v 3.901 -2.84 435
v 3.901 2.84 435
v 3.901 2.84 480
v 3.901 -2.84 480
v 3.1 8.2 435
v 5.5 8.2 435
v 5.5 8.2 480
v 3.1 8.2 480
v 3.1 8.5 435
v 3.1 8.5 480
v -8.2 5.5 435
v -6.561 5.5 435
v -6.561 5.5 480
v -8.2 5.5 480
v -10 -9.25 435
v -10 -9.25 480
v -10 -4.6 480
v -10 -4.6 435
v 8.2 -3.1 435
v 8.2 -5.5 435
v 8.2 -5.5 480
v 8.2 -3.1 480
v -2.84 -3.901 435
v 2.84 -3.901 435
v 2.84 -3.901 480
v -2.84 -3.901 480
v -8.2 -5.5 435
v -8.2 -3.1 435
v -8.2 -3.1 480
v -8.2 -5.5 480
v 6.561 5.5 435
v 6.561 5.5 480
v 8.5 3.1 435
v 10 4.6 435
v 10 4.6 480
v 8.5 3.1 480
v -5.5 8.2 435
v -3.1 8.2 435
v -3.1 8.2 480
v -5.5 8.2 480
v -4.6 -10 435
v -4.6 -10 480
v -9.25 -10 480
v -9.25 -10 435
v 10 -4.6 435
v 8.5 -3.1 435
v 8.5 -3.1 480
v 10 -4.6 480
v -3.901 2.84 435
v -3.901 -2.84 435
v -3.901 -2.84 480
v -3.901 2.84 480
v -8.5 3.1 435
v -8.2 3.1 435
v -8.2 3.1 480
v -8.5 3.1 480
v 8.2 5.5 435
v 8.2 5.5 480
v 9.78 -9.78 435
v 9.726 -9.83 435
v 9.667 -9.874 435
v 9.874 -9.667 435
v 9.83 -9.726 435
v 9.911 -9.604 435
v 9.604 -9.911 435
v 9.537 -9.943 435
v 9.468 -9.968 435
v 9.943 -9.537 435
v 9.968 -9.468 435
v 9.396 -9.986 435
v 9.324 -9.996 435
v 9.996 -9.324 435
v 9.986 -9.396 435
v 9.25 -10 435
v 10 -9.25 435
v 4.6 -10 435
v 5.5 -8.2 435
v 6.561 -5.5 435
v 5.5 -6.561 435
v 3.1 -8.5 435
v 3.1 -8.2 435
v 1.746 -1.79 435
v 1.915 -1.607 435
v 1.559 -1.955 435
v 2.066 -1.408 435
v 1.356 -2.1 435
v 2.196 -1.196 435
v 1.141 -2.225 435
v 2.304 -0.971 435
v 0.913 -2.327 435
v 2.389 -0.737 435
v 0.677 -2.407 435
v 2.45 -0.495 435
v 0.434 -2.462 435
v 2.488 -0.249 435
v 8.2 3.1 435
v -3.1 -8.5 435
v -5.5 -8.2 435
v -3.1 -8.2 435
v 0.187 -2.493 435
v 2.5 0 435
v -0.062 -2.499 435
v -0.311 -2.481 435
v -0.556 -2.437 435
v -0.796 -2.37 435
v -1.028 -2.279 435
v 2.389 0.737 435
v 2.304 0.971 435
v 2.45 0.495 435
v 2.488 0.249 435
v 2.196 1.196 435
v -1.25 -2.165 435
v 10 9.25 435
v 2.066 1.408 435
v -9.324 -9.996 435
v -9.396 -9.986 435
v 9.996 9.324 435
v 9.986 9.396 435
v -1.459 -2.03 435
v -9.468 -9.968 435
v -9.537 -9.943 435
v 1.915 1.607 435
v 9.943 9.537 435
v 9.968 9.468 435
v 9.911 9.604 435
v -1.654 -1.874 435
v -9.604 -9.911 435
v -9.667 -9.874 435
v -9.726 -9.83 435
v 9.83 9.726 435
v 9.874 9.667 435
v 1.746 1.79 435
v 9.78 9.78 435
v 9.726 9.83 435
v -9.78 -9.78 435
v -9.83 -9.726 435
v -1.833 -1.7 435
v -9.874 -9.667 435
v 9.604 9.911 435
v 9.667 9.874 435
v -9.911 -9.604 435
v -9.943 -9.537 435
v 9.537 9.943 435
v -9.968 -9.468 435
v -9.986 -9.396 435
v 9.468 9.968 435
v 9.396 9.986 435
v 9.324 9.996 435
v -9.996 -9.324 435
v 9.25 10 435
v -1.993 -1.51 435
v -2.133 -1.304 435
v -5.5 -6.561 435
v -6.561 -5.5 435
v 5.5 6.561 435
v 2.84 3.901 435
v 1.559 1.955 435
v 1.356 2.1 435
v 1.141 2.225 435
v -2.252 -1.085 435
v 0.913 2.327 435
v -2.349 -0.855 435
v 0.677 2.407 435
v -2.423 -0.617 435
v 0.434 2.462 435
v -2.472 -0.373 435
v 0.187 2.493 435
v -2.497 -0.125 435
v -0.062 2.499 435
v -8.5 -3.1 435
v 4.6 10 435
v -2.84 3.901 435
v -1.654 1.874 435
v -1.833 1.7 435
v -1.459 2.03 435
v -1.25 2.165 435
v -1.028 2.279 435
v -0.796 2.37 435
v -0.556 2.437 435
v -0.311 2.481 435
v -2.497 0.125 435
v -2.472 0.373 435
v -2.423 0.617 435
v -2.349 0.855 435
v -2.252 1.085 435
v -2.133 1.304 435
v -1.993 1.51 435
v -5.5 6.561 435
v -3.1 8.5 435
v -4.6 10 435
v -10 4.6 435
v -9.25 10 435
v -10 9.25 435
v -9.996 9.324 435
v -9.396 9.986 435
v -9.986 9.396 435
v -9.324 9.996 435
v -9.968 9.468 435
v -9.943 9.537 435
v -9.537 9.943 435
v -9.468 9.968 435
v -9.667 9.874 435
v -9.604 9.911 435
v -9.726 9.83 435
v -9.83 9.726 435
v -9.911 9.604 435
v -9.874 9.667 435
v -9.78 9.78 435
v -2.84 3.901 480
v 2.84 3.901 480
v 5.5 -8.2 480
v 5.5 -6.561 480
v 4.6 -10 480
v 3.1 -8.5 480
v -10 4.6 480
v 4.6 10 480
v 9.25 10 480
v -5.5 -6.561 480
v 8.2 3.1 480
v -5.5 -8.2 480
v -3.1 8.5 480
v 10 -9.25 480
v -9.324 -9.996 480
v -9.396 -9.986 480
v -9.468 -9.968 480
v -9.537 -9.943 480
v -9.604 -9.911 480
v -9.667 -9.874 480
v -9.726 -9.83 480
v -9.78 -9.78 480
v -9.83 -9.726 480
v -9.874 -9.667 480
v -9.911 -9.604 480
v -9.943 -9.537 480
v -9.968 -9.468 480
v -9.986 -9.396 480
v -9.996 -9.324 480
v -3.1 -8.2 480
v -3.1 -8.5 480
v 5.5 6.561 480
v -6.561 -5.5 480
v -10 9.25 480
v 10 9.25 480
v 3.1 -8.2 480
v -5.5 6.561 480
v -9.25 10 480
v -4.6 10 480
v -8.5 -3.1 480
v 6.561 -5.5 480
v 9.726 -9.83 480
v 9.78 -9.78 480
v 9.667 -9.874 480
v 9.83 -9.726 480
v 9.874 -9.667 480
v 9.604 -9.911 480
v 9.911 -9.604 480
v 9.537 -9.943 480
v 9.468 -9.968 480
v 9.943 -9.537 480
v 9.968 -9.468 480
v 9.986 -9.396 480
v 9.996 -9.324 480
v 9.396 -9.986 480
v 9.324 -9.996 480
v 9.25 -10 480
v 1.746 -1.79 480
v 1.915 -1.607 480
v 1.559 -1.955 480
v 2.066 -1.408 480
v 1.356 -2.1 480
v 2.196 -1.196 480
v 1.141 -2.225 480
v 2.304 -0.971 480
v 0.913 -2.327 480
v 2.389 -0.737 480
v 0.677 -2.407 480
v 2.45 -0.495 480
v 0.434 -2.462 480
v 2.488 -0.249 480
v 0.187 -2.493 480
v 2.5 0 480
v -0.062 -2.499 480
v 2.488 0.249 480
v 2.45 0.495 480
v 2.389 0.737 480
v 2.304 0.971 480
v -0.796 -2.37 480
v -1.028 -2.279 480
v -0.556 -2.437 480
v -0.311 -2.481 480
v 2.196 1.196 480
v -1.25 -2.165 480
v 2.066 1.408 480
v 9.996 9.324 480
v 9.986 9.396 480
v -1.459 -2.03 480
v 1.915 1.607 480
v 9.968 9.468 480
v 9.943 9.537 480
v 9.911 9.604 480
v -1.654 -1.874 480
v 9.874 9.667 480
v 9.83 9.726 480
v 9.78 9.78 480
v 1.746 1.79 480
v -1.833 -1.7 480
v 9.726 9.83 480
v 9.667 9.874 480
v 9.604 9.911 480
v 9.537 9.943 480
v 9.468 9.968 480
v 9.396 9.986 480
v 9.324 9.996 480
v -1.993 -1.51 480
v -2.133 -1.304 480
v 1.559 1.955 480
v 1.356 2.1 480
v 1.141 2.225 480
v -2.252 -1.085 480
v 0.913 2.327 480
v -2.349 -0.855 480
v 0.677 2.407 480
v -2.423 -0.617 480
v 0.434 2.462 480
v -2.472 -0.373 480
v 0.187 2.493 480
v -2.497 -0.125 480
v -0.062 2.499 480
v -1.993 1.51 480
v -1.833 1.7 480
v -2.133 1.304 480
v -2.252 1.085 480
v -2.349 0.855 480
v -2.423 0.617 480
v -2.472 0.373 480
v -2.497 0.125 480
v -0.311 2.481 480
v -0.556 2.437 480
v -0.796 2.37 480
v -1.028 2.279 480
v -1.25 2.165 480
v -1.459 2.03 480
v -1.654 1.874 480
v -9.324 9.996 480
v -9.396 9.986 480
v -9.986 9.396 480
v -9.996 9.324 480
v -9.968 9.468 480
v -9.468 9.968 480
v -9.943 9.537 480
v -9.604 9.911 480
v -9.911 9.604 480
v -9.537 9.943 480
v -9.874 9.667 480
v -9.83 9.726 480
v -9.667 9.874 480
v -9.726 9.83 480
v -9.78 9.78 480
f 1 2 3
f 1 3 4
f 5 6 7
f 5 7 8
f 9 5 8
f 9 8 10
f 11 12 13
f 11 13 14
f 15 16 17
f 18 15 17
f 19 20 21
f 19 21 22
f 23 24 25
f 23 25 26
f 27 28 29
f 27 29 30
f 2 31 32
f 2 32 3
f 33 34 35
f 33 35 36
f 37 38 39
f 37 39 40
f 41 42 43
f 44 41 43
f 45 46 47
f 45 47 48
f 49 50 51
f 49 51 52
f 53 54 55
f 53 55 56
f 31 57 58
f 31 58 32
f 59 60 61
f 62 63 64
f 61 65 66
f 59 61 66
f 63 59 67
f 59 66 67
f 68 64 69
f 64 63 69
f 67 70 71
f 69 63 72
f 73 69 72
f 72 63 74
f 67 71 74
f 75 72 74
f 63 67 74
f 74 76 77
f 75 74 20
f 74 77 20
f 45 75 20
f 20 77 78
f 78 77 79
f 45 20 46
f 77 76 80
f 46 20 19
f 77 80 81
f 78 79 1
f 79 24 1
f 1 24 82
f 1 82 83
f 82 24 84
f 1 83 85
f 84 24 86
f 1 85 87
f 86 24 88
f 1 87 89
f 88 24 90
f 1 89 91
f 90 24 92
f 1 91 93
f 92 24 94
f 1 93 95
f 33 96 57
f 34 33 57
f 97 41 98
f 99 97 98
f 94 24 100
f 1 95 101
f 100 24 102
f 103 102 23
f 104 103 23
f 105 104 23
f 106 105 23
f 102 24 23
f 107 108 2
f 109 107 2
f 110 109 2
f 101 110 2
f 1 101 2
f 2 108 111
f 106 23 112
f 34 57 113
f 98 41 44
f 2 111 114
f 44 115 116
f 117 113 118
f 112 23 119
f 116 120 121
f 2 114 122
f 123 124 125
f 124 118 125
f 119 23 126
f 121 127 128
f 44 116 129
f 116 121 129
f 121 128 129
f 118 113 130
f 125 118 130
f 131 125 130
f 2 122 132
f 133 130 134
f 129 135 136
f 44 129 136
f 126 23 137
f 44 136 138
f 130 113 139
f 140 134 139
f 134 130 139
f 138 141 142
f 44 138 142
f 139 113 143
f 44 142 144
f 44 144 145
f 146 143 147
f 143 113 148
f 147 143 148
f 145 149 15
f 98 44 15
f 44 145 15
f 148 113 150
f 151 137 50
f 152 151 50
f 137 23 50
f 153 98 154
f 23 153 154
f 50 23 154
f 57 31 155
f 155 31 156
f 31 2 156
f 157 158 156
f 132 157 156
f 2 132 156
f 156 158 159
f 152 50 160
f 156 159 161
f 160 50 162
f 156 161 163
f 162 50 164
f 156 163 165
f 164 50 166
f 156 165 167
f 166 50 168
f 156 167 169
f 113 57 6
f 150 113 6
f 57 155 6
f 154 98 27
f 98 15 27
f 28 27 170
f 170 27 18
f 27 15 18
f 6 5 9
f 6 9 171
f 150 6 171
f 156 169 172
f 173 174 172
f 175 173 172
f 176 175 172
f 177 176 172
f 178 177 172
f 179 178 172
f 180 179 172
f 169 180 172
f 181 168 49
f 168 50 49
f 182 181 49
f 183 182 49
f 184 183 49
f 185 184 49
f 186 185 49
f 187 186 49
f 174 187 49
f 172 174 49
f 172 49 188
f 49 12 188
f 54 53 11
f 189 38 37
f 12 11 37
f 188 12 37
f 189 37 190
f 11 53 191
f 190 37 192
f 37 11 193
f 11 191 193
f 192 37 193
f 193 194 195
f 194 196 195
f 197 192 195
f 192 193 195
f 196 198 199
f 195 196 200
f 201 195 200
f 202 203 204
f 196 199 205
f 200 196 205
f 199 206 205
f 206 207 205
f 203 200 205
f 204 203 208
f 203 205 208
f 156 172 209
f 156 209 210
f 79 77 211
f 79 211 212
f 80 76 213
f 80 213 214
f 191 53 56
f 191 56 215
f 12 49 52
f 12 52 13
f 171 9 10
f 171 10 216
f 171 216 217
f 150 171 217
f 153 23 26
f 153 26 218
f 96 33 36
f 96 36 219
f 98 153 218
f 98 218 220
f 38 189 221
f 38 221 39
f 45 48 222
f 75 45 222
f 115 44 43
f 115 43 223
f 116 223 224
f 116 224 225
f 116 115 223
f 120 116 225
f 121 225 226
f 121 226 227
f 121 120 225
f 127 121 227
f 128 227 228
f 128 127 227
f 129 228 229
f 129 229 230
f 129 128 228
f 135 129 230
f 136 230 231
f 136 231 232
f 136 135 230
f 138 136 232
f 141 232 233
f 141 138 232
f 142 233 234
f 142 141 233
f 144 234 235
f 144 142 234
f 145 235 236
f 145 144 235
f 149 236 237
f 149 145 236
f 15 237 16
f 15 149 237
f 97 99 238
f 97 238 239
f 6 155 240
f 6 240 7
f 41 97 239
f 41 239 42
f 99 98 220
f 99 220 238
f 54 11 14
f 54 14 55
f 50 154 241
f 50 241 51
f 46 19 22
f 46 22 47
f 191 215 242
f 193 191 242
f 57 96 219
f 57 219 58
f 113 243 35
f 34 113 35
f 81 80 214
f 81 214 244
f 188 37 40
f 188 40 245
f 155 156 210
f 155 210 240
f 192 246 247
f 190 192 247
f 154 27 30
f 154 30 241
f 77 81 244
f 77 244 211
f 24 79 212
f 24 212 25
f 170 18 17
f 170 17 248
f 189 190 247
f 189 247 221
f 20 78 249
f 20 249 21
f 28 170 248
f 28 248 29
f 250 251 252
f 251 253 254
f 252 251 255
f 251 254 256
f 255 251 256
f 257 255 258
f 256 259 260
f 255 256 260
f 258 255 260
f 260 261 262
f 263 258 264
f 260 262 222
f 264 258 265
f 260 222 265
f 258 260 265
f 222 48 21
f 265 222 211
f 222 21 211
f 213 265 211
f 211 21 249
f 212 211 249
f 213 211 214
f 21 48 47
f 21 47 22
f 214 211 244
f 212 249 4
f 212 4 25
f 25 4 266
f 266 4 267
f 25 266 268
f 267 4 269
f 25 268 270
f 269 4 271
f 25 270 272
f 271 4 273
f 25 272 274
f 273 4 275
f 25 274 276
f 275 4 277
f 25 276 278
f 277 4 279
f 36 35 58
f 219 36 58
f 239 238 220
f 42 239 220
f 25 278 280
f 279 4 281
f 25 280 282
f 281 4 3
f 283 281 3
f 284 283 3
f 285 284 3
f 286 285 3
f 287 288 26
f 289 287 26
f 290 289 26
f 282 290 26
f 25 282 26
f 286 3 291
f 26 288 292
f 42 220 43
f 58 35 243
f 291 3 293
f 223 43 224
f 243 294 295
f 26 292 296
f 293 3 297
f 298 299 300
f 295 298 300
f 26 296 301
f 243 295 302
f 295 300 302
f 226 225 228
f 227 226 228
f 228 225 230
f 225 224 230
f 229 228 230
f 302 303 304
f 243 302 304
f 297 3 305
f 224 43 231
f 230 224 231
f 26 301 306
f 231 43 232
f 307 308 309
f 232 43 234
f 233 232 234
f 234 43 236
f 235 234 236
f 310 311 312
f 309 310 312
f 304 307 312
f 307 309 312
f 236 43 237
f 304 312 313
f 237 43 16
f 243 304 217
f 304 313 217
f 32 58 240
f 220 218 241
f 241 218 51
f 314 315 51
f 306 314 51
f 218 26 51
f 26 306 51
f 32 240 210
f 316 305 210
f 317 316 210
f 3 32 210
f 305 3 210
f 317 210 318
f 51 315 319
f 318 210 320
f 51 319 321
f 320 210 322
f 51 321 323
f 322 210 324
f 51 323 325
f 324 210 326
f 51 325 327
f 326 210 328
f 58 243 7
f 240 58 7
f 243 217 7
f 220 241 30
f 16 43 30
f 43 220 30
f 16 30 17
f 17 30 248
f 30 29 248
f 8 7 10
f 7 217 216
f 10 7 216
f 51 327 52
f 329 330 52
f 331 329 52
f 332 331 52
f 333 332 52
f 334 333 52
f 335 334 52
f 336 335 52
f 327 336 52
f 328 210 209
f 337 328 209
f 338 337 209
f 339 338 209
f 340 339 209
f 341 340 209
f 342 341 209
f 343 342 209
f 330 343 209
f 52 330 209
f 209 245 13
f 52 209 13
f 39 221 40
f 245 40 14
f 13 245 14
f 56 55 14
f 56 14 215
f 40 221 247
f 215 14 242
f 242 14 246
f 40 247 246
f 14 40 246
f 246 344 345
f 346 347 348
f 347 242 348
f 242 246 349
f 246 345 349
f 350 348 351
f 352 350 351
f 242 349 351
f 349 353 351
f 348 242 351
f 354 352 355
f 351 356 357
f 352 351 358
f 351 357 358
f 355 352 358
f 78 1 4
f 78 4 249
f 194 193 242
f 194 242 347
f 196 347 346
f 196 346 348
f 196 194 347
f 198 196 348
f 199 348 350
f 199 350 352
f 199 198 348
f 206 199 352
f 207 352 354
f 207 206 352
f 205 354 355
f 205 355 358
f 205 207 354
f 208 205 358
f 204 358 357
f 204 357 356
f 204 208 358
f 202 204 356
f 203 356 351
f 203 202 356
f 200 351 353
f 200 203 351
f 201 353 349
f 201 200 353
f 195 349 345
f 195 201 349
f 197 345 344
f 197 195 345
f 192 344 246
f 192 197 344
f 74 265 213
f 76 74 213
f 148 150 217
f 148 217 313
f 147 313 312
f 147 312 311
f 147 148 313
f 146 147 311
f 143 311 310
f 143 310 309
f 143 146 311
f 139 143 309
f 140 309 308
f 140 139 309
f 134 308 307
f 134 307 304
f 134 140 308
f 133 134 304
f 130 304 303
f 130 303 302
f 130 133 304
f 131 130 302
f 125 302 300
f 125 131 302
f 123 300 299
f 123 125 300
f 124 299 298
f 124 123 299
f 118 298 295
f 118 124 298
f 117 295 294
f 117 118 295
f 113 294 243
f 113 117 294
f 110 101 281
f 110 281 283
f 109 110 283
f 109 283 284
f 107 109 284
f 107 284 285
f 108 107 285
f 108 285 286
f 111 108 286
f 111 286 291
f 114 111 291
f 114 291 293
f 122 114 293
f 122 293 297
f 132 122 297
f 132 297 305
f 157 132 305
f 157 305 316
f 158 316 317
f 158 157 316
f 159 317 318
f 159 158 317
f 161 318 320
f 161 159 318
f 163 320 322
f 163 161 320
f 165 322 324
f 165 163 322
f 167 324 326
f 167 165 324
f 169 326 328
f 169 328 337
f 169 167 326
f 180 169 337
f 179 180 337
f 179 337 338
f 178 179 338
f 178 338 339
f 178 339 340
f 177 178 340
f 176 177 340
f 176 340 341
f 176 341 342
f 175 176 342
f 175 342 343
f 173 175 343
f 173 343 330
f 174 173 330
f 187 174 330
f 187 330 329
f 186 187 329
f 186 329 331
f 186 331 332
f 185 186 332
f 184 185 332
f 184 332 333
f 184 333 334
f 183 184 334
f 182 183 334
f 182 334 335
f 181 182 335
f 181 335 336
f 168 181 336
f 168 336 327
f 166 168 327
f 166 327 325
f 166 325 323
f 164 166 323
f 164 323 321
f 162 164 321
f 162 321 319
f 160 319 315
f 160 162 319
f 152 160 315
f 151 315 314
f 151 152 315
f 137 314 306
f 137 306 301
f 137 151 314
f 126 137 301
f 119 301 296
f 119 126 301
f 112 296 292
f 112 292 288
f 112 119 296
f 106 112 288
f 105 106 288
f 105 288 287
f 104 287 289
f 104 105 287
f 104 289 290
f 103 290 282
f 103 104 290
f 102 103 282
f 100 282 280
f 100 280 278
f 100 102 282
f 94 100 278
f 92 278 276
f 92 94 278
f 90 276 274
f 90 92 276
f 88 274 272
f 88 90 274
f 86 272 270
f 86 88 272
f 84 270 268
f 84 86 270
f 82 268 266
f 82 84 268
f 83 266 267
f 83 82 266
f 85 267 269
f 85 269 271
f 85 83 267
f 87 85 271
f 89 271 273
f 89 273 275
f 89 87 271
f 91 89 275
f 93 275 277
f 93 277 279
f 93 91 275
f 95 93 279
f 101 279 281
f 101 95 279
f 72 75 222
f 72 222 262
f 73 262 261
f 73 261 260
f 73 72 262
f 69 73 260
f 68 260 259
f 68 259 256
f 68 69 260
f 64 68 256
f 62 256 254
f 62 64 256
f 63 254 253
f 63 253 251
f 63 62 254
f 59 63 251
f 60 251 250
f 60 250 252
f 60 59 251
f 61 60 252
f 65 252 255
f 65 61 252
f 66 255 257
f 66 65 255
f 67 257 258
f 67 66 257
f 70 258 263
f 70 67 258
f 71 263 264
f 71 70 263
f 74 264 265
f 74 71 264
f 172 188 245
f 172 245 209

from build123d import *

# Parameters (mm, degrees)
CROQUIS1_R              = 2.5
SALIENTE_EXTRUIR1_DEPTH = 480
CUT_EXTRUDE1_DEPTH      = 25
CUT_EXTRUDE1_DEPTH_BACK = 24
SKETCH2_W               = 600
SKETCH2_H               = 26.97008712
CUT_EXTRUDE4_DEPTH      = 21
CUT_EXTRUDE4_DEPTH_BACK = 41
SKETCH4_W               = 140
SKETCH4_H               = 71.605139047


with BuildPart() as part:
    # Croquis1 → Saliente-Extruir1 (new body)
    with BuildSketch(Plane.XY):
        with BuildLine():
            Line((-4.6, 10), (-3.1, 8.5))
            Line((-3.1, 8.5), (-3.1, 8.2))
            Line((-3.1, 8.2), (-5.5, 8.2))
            Line((-5.5, 8.2), (-5.5, 6.560660172))
            Line((-5.5, 6.560660172), (-2.84, 3.900660172))
            Line((-2.84, 3.900660172), (0, 3.900660172))
            Line((0, 3.900660172), (2.84, 3.900660172))
            Line((2.84, 3.900660172), (5.5, 6.560660172))
            Line((5.5, 6.560660172), (5.5, 8.2))
            Line((5.5, 8.2), (3.1, 8.2))
            Line((3.1, 8.2), (3.1, 8.5))
            Line((3.1, 8.5), (4.6, 10))
            Line((4.6, 10), (9.25, 10))
            ThreePointArc((9.25, 10), (9.780330086, 9.780330086), (10, 9.25))
            Line((10, 9.25), (10, 4.6))
            Line((10, 4.6), (8.5, 3.1))
            Line((8.5, 3.1), (8.2, 3.1))
            Line((8.2, 3.1), (8.2, 5.5))
            Line((8.2, 5.5), (6.560660172, 5.5))
            Line((6.560660172, 5.5), (3.900660172, 2.84))
            Line((3.900660172, 2.84), (3.900660172, 0))
            Line((3.900660172, 0), (3.900660172, -2.84))
            Line((3.900660172, -2.84), (6.560660172, -5.5))
            Line((6.560660172, -5.5), (8.2, -5.5))
            Line((8.2, -5.5), (8.2, -3.1))
            Line((8.2, -3.1), (8.5, -3.1))
            Line((8.5, -3.1), (10, -4.6))
            Line((10, -4.6), (10, -9.25))
            ThreePointArc((10, -9.25), (9.780330086, -9.780330086), (9.25, -10))
            Line((9.25, -10), (4.6, -10))
            Line((4.6, -10), (3.1, -8.5))
            Line((3.1, -8.5), (3.1, -8.2))
            Line((3.1, -8.2), (5.5, -8.2))
            Line((5.5, -8.2), (5.5, -6.560660172))
            Line((5.5, -6.560660172), (2.84, -3.900660172))
            Line((2.84, -3.900660172), (0, -3.900660172))
            Line((0, -3.900660172), (-2.84, -3.900660172))
            Line((-2.84, -3.900660172), (-5.5, -6.560660172))
            Line((-5.5, -6.560660172), (-5.5, -8.2))
            Line((-5.5, -8.2), (-3.1, -8.2))
            Line((-3.1, -8.2), (-3.1, -8.5))
            Line((-3.1, -8.5), (-4.6, -10))
            Line((-4.6, -10), (-9.25, -10))
            ThreePointArc((-9.25, -10), (-9.780330086, -9.780330086), (-10, -9.25))
            Line((-10, -9.25), (-10, -4.6))
            Line((-10, -4.6), (-8.5, -3.1))
            Line((-8.5, -3.1), (-8.2, -3.1))
            Line((-8.2, -3.1), (-8.2, -5.5))
            Line((-8.2, -5.5), (-6.560660172, -5.5))
            Line((-6.560660172, -5.5), (-3.900660172, -2.84))
            Line((-3.900660172, -2.84), (-3.900660172, 0))
            Line((-3.900660172, 0), (-3.900660172, 2.84))
            Line((-3.900660172, 2.84), (-6.560660172, 5.5))
            Line((-6.560660172, 5.5), (-8.2, 5.5))
            Line((-8.2, 5.5), (-8.2, 3.1))
            Line((-8.2, 3.1), (-8.5, 3.1))
            Line((-8.5, 3.1), (-10, 4.6))
            Line((-10, 4.6), (-10, 9.25))
            ThreePointArc((-10, 9.25), (-9.780330086, 9.780330086), (-9.25, 10))
            Line((-9.25, 10), (-4.6, 10))
        make_face()
        Circle(CROQUIS1_R, mode=Mode.SUBTRACT)
    extrude(amount=SALIENTE_EXTRUIR1_DEPTH)

    # Sketch2 → Cut-Extrude1 (cut, two sides: drawn at the far end of the back side and taken through both)
    with BuildSketch(Plane(origin=(0, 0, 0), x_dir=(0, 0, -1), z_dir=(1, 0, 0)).offset(-CUT_EXTRUDE1_DEPTH_BACK)):
        Rectangle(SKETCH2_W, SKETCH2_H)
    extrude(amount=CUT_EXTRUDE1_DEPTH + CUT_EXTRUDE1_DEPTH_BACK, mode=Mode.SUBTRACT)

    # Sketch4 → Cut-Extrude4 (cut, two sides: drawn at the far end of the back side and taken through both)
    with BuildSketch(Plane(origin=(0, 0, 0), x_dir=(0, 0, -1), z_dir=(1, 0, 0)).offset(-CUT_EXTRUDE4_DEPTH_BACK)):
        with Locations((-365, -0.774109611)):
            Rectangle(SKETCH4_W, SKETCH4_H)
    extrude(amount=CUT_EXTRUDE4_DEPTH + CUT_EXTRUDE4_DEPTH_BACK, mode=Mode.SUBTRACT)


solid = part.part
